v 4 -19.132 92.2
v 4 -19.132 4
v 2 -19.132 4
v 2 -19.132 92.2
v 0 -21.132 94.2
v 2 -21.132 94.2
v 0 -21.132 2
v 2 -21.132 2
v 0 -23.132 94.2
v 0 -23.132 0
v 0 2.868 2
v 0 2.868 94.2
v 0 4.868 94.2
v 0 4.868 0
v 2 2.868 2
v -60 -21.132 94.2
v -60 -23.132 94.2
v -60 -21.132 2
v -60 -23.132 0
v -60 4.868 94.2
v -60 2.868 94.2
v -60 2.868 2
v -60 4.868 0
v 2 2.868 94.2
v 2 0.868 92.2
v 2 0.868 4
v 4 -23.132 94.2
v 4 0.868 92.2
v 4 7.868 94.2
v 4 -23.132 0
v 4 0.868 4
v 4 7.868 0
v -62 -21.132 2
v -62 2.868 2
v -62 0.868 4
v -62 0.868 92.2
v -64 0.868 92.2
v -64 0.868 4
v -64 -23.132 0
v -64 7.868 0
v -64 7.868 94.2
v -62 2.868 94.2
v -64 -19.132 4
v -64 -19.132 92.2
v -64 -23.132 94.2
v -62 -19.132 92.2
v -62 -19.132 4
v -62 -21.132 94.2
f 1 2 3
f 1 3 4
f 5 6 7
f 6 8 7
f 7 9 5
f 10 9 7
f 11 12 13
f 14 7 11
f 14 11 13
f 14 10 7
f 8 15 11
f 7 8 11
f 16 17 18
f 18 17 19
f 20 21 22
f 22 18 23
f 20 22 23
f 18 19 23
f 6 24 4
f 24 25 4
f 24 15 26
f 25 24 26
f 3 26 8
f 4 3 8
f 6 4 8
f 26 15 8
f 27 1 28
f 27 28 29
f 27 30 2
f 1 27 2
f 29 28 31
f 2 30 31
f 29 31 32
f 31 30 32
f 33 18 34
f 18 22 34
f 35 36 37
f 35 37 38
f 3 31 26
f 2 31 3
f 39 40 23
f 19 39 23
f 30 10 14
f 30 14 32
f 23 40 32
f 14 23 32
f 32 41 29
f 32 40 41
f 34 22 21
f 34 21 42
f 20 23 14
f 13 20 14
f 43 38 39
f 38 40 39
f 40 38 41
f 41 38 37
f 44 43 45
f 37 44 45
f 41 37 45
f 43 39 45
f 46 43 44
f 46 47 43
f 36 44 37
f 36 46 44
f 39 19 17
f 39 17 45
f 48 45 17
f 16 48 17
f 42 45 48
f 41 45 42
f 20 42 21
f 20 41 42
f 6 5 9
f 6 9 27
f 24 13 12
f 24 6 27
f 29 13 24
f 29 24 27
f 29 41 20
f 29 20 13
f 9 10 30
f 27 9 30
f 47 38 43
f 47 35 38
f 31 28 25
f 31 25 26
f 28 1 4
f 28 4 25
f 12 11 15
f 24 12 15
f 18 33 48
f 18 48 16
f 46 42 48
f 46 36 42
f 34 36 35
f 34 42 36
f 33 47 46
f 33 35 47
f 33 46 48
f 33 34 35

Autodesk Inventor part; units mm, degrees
sketch "Sketch1" plane through (0, 0, 0) normal (0, 0, 1) x (1, 0, 0)
  line L0 (0, 2.868) -> (2, 2.868)
  line L1 (2, 2.868) -> (2, -21.132)
  line L2 (2, -21.132) -> (0, -21.132)
  line L3 (0, -21.132) -> (0, 2.868)
  line L4 (4, -23.132) -> (4, 4.868)
  line L5 (4, 4.868) -> (0, 4.868)
  line L6 (0, -23.132) -> (4, -23.132)
  line L7 (0, 2.868) -> (0, 4.868)
  line L8 (0, -23.132) -> (0, -21.132)
  line L9 (-30, 5.364) -> (-30, -29.5729)
  line L10 (-60, 2.868) -> (-62, 2.868)
  line L11 (-62, 2.868) -> (-62, -21.132)
  line L12 (-62, -21.132) -> (-60, -21.132)
  line L13 (-60, -21.132) -> (-60, 2.868)
  line L14 (-64, -23.132) -> (-64, 4.868)
  line L15 (-64, 4.868) -> (-60, 4.868)
  line L16 (-60, -23.132) -> (-64, -23.132)
  line L17 (-60, 2.868) -> (-60, 4.868)
  line L18 (-60, -23.132) -> (-60, -21.132)
  point P0 (0, 0)
  point P1 (-60, 0)
  dimension "d0" = 2
  dimension "d1" = 24
  dimension "d2" = 2
  dimension "d3" = 32
extrude "Extrusion1" add sketch "Sketch1" along normal blind 94.2 contours L7 L5 L4 L6 L8 L2 L1 L0 | L10 L11 L12 L18 L16 L14 L15 L17
sketch "Sketch3" plane through (-64, 4.868, 0) normal (0, 1, 0) x (1, 0, 0)
  line L0 (4, 0) -> (0, 0) projected
  line L1 (0, 0) -> (0, -94.2) projected
  line L2 (4, -94.2) -> (0, -94.2) projected
  line L3 (4, 0) -> (4, -94.2) projected
  line L4 (68, 0) -> (64, 0) projected
  line L5 (64, 0) -> (64, -94.2) projected
  line L6 (68, -94.2) -> (64, -94.2) projected
  line L7 (68, 0) -> (68, -94.2) projected
  line L8 (0, 0) -> (68, 0)
  line L9 (68, 0) -> (68, -94.2)
  line L10 (68, -94.2) -> (0, -94.2)
  line L11 (0, -94.2) -> (0, 0)
extrude "Extrusion2" add sketch "Sketch3" along normal blind 3
sketch "Sketch4" plane through (0, 0, 0) normal (0, 0, -1) x (-1, 0, 0)
  line L0 (0, 2.868) -> (-2, 2.868) projected
  line L1 (0, 4.868) -> (0, 2.868) projected
  line L2 (0, 4.868) -> (60, 4.868) projected
  line L3 (60, 2.868) -> (60, 4.868) projected
  line L4 (62, 2.868) -> (60, 2.868) projected
  line L5 (62, -21.132) -> (62, 2.868) projected
  line L6 (60, -21.132) -> (62, -21.132) projected
  line L7 (60, -23.132) -> (60, -21.132) projected
  line L8 (64, -23.132) -> (60, -23.132) projected
  line L9 (64, -23.132) -> (64, 7.868) projected
  line L10 (-4, 7.868) -> (64, 7.868) projected
  line L11 (-4, -23.132) -> (-4, 7.868) projected
  line L12 (0, -23.132) -> (-4, -23.132) projected
  line L13 (0, -21.132) -> (0, -23.132) projected
  line L14 (-2, -21.132) -> (0, -21.132) projected
  line L15 (-2, 2.868) -> (-2, -21.132) projected
  line L16 (-4, 7.868) -> (64, 7.868)
  line L17 (64, 7.868) -> (64, -23.132)
  line L18 (64, -23.132) -> (-4, -23.132)
  line L19 (-4, -23.132) -> (-4, 7.868)
  line L20 (0, -23.132) -> (0, 4.868)
  line L21 (0, 4.868) -> (60, 4.868)
  line L22 (60, -23.132) -> (60, 4.868)
  line L23 (60, -23.132) -> (60, -21.132) projected
  point P0 (0, 0)
extrude "Extrusion3" add sketch "Sketch4" against normal blind 2 contours L20 L14 L15 L0 | L0 L15 L14 L13 L12 L11 L10 L9 L8 L7 L6 L5 L4 L3 L2 L1 | L4 L5 L6 L22
sketch "Sketch7" plane through (4, -23.132, 94.2) normal (1, 0, 0) x (0, 0, -1)
  line L0 (2, 24) -> (90.2, 24)
  line L1 (90.2, 24) -> (90.2, 4)
  line L2 (90.2, 4) -> (2, 4)
  line L3 (2, 4) -> (2, 24)
  line L4 (92.2, 26) -> (92.2, 2) projected
  line L5 (92.2, 26) -> (0, 26) projected
  line L6 (0, 0) -> (0, 31) projected
  line L7 (92.2, 2) -> (0, 2) projected
  point P0 (94.2, 23.132)
  dimension "d12" = 2
  dimension "d13" = 2
  dimension "d14" = 2
  dimension "d15" = 2
extrude "Extrusion4" cut sketch "Sketch7" against normal up to surface (68 mm away) contours L0 L1 L2 L3
sketch "Sketch9" plane through (-64, -23.132, 0) normal (-1, 0, 0) x (0, 0, 1)
  line L0 (4, 4) -> (4, 24) projected
  line L1 (4, 24) -> (92.2, 24) projected
  line L2 (92.2, 24) -> (92.2, 4) projected
  line L3 (92.2, 4) -> (4, 4) projected
  line L4 (0, 0) -> (94.2, 0) projected
  line L5 (94.2, 0) -> (94.2, 31) projected
  line L6 (0, 31) -> (94.2, 31) projected
  line L7 (0, 0) -> (0, 31) projected
  point P0 (0, 23.132)
ref_plane "Work Plane1" through (-64, 2.868, 4) normal (1, 0, 0) x (0, 1, 0)
sketch "Sketch10" plane through (-64, 7.868, 0) normal (0, 1, 0) x (1, 0, 0)
  line L0 (0, 0) -> (0, -94.2)
  line L1 (68, 0) -> (0, 0) projected
  line L2 (0, -94.2) -> (68, -94.2) projected
  line L3 (0, 0) -> (0, -94.2) projected
  line L4 (0, -32.1) -> (0, 0)
  line L5 (0, 0) -> (0, -94.2) projected
  line L6 (0, -94.2) -> (68, -94.2) projected
  line L7 (68, -94.2) -> (68, 0) projected
  line L8 (68, 0) -> (0, 0) projected
  point P0 (64, 0)
  dimension "d36" = 0
sketch "Sketch11" plane through (-64, 7.868, 0) normal (0, 1, 0) x (1, 0, 0)
  line L0 (68, 0) -> (68, -94.2)
  point P0 (64, 0)
properties part number "kontroller2"
